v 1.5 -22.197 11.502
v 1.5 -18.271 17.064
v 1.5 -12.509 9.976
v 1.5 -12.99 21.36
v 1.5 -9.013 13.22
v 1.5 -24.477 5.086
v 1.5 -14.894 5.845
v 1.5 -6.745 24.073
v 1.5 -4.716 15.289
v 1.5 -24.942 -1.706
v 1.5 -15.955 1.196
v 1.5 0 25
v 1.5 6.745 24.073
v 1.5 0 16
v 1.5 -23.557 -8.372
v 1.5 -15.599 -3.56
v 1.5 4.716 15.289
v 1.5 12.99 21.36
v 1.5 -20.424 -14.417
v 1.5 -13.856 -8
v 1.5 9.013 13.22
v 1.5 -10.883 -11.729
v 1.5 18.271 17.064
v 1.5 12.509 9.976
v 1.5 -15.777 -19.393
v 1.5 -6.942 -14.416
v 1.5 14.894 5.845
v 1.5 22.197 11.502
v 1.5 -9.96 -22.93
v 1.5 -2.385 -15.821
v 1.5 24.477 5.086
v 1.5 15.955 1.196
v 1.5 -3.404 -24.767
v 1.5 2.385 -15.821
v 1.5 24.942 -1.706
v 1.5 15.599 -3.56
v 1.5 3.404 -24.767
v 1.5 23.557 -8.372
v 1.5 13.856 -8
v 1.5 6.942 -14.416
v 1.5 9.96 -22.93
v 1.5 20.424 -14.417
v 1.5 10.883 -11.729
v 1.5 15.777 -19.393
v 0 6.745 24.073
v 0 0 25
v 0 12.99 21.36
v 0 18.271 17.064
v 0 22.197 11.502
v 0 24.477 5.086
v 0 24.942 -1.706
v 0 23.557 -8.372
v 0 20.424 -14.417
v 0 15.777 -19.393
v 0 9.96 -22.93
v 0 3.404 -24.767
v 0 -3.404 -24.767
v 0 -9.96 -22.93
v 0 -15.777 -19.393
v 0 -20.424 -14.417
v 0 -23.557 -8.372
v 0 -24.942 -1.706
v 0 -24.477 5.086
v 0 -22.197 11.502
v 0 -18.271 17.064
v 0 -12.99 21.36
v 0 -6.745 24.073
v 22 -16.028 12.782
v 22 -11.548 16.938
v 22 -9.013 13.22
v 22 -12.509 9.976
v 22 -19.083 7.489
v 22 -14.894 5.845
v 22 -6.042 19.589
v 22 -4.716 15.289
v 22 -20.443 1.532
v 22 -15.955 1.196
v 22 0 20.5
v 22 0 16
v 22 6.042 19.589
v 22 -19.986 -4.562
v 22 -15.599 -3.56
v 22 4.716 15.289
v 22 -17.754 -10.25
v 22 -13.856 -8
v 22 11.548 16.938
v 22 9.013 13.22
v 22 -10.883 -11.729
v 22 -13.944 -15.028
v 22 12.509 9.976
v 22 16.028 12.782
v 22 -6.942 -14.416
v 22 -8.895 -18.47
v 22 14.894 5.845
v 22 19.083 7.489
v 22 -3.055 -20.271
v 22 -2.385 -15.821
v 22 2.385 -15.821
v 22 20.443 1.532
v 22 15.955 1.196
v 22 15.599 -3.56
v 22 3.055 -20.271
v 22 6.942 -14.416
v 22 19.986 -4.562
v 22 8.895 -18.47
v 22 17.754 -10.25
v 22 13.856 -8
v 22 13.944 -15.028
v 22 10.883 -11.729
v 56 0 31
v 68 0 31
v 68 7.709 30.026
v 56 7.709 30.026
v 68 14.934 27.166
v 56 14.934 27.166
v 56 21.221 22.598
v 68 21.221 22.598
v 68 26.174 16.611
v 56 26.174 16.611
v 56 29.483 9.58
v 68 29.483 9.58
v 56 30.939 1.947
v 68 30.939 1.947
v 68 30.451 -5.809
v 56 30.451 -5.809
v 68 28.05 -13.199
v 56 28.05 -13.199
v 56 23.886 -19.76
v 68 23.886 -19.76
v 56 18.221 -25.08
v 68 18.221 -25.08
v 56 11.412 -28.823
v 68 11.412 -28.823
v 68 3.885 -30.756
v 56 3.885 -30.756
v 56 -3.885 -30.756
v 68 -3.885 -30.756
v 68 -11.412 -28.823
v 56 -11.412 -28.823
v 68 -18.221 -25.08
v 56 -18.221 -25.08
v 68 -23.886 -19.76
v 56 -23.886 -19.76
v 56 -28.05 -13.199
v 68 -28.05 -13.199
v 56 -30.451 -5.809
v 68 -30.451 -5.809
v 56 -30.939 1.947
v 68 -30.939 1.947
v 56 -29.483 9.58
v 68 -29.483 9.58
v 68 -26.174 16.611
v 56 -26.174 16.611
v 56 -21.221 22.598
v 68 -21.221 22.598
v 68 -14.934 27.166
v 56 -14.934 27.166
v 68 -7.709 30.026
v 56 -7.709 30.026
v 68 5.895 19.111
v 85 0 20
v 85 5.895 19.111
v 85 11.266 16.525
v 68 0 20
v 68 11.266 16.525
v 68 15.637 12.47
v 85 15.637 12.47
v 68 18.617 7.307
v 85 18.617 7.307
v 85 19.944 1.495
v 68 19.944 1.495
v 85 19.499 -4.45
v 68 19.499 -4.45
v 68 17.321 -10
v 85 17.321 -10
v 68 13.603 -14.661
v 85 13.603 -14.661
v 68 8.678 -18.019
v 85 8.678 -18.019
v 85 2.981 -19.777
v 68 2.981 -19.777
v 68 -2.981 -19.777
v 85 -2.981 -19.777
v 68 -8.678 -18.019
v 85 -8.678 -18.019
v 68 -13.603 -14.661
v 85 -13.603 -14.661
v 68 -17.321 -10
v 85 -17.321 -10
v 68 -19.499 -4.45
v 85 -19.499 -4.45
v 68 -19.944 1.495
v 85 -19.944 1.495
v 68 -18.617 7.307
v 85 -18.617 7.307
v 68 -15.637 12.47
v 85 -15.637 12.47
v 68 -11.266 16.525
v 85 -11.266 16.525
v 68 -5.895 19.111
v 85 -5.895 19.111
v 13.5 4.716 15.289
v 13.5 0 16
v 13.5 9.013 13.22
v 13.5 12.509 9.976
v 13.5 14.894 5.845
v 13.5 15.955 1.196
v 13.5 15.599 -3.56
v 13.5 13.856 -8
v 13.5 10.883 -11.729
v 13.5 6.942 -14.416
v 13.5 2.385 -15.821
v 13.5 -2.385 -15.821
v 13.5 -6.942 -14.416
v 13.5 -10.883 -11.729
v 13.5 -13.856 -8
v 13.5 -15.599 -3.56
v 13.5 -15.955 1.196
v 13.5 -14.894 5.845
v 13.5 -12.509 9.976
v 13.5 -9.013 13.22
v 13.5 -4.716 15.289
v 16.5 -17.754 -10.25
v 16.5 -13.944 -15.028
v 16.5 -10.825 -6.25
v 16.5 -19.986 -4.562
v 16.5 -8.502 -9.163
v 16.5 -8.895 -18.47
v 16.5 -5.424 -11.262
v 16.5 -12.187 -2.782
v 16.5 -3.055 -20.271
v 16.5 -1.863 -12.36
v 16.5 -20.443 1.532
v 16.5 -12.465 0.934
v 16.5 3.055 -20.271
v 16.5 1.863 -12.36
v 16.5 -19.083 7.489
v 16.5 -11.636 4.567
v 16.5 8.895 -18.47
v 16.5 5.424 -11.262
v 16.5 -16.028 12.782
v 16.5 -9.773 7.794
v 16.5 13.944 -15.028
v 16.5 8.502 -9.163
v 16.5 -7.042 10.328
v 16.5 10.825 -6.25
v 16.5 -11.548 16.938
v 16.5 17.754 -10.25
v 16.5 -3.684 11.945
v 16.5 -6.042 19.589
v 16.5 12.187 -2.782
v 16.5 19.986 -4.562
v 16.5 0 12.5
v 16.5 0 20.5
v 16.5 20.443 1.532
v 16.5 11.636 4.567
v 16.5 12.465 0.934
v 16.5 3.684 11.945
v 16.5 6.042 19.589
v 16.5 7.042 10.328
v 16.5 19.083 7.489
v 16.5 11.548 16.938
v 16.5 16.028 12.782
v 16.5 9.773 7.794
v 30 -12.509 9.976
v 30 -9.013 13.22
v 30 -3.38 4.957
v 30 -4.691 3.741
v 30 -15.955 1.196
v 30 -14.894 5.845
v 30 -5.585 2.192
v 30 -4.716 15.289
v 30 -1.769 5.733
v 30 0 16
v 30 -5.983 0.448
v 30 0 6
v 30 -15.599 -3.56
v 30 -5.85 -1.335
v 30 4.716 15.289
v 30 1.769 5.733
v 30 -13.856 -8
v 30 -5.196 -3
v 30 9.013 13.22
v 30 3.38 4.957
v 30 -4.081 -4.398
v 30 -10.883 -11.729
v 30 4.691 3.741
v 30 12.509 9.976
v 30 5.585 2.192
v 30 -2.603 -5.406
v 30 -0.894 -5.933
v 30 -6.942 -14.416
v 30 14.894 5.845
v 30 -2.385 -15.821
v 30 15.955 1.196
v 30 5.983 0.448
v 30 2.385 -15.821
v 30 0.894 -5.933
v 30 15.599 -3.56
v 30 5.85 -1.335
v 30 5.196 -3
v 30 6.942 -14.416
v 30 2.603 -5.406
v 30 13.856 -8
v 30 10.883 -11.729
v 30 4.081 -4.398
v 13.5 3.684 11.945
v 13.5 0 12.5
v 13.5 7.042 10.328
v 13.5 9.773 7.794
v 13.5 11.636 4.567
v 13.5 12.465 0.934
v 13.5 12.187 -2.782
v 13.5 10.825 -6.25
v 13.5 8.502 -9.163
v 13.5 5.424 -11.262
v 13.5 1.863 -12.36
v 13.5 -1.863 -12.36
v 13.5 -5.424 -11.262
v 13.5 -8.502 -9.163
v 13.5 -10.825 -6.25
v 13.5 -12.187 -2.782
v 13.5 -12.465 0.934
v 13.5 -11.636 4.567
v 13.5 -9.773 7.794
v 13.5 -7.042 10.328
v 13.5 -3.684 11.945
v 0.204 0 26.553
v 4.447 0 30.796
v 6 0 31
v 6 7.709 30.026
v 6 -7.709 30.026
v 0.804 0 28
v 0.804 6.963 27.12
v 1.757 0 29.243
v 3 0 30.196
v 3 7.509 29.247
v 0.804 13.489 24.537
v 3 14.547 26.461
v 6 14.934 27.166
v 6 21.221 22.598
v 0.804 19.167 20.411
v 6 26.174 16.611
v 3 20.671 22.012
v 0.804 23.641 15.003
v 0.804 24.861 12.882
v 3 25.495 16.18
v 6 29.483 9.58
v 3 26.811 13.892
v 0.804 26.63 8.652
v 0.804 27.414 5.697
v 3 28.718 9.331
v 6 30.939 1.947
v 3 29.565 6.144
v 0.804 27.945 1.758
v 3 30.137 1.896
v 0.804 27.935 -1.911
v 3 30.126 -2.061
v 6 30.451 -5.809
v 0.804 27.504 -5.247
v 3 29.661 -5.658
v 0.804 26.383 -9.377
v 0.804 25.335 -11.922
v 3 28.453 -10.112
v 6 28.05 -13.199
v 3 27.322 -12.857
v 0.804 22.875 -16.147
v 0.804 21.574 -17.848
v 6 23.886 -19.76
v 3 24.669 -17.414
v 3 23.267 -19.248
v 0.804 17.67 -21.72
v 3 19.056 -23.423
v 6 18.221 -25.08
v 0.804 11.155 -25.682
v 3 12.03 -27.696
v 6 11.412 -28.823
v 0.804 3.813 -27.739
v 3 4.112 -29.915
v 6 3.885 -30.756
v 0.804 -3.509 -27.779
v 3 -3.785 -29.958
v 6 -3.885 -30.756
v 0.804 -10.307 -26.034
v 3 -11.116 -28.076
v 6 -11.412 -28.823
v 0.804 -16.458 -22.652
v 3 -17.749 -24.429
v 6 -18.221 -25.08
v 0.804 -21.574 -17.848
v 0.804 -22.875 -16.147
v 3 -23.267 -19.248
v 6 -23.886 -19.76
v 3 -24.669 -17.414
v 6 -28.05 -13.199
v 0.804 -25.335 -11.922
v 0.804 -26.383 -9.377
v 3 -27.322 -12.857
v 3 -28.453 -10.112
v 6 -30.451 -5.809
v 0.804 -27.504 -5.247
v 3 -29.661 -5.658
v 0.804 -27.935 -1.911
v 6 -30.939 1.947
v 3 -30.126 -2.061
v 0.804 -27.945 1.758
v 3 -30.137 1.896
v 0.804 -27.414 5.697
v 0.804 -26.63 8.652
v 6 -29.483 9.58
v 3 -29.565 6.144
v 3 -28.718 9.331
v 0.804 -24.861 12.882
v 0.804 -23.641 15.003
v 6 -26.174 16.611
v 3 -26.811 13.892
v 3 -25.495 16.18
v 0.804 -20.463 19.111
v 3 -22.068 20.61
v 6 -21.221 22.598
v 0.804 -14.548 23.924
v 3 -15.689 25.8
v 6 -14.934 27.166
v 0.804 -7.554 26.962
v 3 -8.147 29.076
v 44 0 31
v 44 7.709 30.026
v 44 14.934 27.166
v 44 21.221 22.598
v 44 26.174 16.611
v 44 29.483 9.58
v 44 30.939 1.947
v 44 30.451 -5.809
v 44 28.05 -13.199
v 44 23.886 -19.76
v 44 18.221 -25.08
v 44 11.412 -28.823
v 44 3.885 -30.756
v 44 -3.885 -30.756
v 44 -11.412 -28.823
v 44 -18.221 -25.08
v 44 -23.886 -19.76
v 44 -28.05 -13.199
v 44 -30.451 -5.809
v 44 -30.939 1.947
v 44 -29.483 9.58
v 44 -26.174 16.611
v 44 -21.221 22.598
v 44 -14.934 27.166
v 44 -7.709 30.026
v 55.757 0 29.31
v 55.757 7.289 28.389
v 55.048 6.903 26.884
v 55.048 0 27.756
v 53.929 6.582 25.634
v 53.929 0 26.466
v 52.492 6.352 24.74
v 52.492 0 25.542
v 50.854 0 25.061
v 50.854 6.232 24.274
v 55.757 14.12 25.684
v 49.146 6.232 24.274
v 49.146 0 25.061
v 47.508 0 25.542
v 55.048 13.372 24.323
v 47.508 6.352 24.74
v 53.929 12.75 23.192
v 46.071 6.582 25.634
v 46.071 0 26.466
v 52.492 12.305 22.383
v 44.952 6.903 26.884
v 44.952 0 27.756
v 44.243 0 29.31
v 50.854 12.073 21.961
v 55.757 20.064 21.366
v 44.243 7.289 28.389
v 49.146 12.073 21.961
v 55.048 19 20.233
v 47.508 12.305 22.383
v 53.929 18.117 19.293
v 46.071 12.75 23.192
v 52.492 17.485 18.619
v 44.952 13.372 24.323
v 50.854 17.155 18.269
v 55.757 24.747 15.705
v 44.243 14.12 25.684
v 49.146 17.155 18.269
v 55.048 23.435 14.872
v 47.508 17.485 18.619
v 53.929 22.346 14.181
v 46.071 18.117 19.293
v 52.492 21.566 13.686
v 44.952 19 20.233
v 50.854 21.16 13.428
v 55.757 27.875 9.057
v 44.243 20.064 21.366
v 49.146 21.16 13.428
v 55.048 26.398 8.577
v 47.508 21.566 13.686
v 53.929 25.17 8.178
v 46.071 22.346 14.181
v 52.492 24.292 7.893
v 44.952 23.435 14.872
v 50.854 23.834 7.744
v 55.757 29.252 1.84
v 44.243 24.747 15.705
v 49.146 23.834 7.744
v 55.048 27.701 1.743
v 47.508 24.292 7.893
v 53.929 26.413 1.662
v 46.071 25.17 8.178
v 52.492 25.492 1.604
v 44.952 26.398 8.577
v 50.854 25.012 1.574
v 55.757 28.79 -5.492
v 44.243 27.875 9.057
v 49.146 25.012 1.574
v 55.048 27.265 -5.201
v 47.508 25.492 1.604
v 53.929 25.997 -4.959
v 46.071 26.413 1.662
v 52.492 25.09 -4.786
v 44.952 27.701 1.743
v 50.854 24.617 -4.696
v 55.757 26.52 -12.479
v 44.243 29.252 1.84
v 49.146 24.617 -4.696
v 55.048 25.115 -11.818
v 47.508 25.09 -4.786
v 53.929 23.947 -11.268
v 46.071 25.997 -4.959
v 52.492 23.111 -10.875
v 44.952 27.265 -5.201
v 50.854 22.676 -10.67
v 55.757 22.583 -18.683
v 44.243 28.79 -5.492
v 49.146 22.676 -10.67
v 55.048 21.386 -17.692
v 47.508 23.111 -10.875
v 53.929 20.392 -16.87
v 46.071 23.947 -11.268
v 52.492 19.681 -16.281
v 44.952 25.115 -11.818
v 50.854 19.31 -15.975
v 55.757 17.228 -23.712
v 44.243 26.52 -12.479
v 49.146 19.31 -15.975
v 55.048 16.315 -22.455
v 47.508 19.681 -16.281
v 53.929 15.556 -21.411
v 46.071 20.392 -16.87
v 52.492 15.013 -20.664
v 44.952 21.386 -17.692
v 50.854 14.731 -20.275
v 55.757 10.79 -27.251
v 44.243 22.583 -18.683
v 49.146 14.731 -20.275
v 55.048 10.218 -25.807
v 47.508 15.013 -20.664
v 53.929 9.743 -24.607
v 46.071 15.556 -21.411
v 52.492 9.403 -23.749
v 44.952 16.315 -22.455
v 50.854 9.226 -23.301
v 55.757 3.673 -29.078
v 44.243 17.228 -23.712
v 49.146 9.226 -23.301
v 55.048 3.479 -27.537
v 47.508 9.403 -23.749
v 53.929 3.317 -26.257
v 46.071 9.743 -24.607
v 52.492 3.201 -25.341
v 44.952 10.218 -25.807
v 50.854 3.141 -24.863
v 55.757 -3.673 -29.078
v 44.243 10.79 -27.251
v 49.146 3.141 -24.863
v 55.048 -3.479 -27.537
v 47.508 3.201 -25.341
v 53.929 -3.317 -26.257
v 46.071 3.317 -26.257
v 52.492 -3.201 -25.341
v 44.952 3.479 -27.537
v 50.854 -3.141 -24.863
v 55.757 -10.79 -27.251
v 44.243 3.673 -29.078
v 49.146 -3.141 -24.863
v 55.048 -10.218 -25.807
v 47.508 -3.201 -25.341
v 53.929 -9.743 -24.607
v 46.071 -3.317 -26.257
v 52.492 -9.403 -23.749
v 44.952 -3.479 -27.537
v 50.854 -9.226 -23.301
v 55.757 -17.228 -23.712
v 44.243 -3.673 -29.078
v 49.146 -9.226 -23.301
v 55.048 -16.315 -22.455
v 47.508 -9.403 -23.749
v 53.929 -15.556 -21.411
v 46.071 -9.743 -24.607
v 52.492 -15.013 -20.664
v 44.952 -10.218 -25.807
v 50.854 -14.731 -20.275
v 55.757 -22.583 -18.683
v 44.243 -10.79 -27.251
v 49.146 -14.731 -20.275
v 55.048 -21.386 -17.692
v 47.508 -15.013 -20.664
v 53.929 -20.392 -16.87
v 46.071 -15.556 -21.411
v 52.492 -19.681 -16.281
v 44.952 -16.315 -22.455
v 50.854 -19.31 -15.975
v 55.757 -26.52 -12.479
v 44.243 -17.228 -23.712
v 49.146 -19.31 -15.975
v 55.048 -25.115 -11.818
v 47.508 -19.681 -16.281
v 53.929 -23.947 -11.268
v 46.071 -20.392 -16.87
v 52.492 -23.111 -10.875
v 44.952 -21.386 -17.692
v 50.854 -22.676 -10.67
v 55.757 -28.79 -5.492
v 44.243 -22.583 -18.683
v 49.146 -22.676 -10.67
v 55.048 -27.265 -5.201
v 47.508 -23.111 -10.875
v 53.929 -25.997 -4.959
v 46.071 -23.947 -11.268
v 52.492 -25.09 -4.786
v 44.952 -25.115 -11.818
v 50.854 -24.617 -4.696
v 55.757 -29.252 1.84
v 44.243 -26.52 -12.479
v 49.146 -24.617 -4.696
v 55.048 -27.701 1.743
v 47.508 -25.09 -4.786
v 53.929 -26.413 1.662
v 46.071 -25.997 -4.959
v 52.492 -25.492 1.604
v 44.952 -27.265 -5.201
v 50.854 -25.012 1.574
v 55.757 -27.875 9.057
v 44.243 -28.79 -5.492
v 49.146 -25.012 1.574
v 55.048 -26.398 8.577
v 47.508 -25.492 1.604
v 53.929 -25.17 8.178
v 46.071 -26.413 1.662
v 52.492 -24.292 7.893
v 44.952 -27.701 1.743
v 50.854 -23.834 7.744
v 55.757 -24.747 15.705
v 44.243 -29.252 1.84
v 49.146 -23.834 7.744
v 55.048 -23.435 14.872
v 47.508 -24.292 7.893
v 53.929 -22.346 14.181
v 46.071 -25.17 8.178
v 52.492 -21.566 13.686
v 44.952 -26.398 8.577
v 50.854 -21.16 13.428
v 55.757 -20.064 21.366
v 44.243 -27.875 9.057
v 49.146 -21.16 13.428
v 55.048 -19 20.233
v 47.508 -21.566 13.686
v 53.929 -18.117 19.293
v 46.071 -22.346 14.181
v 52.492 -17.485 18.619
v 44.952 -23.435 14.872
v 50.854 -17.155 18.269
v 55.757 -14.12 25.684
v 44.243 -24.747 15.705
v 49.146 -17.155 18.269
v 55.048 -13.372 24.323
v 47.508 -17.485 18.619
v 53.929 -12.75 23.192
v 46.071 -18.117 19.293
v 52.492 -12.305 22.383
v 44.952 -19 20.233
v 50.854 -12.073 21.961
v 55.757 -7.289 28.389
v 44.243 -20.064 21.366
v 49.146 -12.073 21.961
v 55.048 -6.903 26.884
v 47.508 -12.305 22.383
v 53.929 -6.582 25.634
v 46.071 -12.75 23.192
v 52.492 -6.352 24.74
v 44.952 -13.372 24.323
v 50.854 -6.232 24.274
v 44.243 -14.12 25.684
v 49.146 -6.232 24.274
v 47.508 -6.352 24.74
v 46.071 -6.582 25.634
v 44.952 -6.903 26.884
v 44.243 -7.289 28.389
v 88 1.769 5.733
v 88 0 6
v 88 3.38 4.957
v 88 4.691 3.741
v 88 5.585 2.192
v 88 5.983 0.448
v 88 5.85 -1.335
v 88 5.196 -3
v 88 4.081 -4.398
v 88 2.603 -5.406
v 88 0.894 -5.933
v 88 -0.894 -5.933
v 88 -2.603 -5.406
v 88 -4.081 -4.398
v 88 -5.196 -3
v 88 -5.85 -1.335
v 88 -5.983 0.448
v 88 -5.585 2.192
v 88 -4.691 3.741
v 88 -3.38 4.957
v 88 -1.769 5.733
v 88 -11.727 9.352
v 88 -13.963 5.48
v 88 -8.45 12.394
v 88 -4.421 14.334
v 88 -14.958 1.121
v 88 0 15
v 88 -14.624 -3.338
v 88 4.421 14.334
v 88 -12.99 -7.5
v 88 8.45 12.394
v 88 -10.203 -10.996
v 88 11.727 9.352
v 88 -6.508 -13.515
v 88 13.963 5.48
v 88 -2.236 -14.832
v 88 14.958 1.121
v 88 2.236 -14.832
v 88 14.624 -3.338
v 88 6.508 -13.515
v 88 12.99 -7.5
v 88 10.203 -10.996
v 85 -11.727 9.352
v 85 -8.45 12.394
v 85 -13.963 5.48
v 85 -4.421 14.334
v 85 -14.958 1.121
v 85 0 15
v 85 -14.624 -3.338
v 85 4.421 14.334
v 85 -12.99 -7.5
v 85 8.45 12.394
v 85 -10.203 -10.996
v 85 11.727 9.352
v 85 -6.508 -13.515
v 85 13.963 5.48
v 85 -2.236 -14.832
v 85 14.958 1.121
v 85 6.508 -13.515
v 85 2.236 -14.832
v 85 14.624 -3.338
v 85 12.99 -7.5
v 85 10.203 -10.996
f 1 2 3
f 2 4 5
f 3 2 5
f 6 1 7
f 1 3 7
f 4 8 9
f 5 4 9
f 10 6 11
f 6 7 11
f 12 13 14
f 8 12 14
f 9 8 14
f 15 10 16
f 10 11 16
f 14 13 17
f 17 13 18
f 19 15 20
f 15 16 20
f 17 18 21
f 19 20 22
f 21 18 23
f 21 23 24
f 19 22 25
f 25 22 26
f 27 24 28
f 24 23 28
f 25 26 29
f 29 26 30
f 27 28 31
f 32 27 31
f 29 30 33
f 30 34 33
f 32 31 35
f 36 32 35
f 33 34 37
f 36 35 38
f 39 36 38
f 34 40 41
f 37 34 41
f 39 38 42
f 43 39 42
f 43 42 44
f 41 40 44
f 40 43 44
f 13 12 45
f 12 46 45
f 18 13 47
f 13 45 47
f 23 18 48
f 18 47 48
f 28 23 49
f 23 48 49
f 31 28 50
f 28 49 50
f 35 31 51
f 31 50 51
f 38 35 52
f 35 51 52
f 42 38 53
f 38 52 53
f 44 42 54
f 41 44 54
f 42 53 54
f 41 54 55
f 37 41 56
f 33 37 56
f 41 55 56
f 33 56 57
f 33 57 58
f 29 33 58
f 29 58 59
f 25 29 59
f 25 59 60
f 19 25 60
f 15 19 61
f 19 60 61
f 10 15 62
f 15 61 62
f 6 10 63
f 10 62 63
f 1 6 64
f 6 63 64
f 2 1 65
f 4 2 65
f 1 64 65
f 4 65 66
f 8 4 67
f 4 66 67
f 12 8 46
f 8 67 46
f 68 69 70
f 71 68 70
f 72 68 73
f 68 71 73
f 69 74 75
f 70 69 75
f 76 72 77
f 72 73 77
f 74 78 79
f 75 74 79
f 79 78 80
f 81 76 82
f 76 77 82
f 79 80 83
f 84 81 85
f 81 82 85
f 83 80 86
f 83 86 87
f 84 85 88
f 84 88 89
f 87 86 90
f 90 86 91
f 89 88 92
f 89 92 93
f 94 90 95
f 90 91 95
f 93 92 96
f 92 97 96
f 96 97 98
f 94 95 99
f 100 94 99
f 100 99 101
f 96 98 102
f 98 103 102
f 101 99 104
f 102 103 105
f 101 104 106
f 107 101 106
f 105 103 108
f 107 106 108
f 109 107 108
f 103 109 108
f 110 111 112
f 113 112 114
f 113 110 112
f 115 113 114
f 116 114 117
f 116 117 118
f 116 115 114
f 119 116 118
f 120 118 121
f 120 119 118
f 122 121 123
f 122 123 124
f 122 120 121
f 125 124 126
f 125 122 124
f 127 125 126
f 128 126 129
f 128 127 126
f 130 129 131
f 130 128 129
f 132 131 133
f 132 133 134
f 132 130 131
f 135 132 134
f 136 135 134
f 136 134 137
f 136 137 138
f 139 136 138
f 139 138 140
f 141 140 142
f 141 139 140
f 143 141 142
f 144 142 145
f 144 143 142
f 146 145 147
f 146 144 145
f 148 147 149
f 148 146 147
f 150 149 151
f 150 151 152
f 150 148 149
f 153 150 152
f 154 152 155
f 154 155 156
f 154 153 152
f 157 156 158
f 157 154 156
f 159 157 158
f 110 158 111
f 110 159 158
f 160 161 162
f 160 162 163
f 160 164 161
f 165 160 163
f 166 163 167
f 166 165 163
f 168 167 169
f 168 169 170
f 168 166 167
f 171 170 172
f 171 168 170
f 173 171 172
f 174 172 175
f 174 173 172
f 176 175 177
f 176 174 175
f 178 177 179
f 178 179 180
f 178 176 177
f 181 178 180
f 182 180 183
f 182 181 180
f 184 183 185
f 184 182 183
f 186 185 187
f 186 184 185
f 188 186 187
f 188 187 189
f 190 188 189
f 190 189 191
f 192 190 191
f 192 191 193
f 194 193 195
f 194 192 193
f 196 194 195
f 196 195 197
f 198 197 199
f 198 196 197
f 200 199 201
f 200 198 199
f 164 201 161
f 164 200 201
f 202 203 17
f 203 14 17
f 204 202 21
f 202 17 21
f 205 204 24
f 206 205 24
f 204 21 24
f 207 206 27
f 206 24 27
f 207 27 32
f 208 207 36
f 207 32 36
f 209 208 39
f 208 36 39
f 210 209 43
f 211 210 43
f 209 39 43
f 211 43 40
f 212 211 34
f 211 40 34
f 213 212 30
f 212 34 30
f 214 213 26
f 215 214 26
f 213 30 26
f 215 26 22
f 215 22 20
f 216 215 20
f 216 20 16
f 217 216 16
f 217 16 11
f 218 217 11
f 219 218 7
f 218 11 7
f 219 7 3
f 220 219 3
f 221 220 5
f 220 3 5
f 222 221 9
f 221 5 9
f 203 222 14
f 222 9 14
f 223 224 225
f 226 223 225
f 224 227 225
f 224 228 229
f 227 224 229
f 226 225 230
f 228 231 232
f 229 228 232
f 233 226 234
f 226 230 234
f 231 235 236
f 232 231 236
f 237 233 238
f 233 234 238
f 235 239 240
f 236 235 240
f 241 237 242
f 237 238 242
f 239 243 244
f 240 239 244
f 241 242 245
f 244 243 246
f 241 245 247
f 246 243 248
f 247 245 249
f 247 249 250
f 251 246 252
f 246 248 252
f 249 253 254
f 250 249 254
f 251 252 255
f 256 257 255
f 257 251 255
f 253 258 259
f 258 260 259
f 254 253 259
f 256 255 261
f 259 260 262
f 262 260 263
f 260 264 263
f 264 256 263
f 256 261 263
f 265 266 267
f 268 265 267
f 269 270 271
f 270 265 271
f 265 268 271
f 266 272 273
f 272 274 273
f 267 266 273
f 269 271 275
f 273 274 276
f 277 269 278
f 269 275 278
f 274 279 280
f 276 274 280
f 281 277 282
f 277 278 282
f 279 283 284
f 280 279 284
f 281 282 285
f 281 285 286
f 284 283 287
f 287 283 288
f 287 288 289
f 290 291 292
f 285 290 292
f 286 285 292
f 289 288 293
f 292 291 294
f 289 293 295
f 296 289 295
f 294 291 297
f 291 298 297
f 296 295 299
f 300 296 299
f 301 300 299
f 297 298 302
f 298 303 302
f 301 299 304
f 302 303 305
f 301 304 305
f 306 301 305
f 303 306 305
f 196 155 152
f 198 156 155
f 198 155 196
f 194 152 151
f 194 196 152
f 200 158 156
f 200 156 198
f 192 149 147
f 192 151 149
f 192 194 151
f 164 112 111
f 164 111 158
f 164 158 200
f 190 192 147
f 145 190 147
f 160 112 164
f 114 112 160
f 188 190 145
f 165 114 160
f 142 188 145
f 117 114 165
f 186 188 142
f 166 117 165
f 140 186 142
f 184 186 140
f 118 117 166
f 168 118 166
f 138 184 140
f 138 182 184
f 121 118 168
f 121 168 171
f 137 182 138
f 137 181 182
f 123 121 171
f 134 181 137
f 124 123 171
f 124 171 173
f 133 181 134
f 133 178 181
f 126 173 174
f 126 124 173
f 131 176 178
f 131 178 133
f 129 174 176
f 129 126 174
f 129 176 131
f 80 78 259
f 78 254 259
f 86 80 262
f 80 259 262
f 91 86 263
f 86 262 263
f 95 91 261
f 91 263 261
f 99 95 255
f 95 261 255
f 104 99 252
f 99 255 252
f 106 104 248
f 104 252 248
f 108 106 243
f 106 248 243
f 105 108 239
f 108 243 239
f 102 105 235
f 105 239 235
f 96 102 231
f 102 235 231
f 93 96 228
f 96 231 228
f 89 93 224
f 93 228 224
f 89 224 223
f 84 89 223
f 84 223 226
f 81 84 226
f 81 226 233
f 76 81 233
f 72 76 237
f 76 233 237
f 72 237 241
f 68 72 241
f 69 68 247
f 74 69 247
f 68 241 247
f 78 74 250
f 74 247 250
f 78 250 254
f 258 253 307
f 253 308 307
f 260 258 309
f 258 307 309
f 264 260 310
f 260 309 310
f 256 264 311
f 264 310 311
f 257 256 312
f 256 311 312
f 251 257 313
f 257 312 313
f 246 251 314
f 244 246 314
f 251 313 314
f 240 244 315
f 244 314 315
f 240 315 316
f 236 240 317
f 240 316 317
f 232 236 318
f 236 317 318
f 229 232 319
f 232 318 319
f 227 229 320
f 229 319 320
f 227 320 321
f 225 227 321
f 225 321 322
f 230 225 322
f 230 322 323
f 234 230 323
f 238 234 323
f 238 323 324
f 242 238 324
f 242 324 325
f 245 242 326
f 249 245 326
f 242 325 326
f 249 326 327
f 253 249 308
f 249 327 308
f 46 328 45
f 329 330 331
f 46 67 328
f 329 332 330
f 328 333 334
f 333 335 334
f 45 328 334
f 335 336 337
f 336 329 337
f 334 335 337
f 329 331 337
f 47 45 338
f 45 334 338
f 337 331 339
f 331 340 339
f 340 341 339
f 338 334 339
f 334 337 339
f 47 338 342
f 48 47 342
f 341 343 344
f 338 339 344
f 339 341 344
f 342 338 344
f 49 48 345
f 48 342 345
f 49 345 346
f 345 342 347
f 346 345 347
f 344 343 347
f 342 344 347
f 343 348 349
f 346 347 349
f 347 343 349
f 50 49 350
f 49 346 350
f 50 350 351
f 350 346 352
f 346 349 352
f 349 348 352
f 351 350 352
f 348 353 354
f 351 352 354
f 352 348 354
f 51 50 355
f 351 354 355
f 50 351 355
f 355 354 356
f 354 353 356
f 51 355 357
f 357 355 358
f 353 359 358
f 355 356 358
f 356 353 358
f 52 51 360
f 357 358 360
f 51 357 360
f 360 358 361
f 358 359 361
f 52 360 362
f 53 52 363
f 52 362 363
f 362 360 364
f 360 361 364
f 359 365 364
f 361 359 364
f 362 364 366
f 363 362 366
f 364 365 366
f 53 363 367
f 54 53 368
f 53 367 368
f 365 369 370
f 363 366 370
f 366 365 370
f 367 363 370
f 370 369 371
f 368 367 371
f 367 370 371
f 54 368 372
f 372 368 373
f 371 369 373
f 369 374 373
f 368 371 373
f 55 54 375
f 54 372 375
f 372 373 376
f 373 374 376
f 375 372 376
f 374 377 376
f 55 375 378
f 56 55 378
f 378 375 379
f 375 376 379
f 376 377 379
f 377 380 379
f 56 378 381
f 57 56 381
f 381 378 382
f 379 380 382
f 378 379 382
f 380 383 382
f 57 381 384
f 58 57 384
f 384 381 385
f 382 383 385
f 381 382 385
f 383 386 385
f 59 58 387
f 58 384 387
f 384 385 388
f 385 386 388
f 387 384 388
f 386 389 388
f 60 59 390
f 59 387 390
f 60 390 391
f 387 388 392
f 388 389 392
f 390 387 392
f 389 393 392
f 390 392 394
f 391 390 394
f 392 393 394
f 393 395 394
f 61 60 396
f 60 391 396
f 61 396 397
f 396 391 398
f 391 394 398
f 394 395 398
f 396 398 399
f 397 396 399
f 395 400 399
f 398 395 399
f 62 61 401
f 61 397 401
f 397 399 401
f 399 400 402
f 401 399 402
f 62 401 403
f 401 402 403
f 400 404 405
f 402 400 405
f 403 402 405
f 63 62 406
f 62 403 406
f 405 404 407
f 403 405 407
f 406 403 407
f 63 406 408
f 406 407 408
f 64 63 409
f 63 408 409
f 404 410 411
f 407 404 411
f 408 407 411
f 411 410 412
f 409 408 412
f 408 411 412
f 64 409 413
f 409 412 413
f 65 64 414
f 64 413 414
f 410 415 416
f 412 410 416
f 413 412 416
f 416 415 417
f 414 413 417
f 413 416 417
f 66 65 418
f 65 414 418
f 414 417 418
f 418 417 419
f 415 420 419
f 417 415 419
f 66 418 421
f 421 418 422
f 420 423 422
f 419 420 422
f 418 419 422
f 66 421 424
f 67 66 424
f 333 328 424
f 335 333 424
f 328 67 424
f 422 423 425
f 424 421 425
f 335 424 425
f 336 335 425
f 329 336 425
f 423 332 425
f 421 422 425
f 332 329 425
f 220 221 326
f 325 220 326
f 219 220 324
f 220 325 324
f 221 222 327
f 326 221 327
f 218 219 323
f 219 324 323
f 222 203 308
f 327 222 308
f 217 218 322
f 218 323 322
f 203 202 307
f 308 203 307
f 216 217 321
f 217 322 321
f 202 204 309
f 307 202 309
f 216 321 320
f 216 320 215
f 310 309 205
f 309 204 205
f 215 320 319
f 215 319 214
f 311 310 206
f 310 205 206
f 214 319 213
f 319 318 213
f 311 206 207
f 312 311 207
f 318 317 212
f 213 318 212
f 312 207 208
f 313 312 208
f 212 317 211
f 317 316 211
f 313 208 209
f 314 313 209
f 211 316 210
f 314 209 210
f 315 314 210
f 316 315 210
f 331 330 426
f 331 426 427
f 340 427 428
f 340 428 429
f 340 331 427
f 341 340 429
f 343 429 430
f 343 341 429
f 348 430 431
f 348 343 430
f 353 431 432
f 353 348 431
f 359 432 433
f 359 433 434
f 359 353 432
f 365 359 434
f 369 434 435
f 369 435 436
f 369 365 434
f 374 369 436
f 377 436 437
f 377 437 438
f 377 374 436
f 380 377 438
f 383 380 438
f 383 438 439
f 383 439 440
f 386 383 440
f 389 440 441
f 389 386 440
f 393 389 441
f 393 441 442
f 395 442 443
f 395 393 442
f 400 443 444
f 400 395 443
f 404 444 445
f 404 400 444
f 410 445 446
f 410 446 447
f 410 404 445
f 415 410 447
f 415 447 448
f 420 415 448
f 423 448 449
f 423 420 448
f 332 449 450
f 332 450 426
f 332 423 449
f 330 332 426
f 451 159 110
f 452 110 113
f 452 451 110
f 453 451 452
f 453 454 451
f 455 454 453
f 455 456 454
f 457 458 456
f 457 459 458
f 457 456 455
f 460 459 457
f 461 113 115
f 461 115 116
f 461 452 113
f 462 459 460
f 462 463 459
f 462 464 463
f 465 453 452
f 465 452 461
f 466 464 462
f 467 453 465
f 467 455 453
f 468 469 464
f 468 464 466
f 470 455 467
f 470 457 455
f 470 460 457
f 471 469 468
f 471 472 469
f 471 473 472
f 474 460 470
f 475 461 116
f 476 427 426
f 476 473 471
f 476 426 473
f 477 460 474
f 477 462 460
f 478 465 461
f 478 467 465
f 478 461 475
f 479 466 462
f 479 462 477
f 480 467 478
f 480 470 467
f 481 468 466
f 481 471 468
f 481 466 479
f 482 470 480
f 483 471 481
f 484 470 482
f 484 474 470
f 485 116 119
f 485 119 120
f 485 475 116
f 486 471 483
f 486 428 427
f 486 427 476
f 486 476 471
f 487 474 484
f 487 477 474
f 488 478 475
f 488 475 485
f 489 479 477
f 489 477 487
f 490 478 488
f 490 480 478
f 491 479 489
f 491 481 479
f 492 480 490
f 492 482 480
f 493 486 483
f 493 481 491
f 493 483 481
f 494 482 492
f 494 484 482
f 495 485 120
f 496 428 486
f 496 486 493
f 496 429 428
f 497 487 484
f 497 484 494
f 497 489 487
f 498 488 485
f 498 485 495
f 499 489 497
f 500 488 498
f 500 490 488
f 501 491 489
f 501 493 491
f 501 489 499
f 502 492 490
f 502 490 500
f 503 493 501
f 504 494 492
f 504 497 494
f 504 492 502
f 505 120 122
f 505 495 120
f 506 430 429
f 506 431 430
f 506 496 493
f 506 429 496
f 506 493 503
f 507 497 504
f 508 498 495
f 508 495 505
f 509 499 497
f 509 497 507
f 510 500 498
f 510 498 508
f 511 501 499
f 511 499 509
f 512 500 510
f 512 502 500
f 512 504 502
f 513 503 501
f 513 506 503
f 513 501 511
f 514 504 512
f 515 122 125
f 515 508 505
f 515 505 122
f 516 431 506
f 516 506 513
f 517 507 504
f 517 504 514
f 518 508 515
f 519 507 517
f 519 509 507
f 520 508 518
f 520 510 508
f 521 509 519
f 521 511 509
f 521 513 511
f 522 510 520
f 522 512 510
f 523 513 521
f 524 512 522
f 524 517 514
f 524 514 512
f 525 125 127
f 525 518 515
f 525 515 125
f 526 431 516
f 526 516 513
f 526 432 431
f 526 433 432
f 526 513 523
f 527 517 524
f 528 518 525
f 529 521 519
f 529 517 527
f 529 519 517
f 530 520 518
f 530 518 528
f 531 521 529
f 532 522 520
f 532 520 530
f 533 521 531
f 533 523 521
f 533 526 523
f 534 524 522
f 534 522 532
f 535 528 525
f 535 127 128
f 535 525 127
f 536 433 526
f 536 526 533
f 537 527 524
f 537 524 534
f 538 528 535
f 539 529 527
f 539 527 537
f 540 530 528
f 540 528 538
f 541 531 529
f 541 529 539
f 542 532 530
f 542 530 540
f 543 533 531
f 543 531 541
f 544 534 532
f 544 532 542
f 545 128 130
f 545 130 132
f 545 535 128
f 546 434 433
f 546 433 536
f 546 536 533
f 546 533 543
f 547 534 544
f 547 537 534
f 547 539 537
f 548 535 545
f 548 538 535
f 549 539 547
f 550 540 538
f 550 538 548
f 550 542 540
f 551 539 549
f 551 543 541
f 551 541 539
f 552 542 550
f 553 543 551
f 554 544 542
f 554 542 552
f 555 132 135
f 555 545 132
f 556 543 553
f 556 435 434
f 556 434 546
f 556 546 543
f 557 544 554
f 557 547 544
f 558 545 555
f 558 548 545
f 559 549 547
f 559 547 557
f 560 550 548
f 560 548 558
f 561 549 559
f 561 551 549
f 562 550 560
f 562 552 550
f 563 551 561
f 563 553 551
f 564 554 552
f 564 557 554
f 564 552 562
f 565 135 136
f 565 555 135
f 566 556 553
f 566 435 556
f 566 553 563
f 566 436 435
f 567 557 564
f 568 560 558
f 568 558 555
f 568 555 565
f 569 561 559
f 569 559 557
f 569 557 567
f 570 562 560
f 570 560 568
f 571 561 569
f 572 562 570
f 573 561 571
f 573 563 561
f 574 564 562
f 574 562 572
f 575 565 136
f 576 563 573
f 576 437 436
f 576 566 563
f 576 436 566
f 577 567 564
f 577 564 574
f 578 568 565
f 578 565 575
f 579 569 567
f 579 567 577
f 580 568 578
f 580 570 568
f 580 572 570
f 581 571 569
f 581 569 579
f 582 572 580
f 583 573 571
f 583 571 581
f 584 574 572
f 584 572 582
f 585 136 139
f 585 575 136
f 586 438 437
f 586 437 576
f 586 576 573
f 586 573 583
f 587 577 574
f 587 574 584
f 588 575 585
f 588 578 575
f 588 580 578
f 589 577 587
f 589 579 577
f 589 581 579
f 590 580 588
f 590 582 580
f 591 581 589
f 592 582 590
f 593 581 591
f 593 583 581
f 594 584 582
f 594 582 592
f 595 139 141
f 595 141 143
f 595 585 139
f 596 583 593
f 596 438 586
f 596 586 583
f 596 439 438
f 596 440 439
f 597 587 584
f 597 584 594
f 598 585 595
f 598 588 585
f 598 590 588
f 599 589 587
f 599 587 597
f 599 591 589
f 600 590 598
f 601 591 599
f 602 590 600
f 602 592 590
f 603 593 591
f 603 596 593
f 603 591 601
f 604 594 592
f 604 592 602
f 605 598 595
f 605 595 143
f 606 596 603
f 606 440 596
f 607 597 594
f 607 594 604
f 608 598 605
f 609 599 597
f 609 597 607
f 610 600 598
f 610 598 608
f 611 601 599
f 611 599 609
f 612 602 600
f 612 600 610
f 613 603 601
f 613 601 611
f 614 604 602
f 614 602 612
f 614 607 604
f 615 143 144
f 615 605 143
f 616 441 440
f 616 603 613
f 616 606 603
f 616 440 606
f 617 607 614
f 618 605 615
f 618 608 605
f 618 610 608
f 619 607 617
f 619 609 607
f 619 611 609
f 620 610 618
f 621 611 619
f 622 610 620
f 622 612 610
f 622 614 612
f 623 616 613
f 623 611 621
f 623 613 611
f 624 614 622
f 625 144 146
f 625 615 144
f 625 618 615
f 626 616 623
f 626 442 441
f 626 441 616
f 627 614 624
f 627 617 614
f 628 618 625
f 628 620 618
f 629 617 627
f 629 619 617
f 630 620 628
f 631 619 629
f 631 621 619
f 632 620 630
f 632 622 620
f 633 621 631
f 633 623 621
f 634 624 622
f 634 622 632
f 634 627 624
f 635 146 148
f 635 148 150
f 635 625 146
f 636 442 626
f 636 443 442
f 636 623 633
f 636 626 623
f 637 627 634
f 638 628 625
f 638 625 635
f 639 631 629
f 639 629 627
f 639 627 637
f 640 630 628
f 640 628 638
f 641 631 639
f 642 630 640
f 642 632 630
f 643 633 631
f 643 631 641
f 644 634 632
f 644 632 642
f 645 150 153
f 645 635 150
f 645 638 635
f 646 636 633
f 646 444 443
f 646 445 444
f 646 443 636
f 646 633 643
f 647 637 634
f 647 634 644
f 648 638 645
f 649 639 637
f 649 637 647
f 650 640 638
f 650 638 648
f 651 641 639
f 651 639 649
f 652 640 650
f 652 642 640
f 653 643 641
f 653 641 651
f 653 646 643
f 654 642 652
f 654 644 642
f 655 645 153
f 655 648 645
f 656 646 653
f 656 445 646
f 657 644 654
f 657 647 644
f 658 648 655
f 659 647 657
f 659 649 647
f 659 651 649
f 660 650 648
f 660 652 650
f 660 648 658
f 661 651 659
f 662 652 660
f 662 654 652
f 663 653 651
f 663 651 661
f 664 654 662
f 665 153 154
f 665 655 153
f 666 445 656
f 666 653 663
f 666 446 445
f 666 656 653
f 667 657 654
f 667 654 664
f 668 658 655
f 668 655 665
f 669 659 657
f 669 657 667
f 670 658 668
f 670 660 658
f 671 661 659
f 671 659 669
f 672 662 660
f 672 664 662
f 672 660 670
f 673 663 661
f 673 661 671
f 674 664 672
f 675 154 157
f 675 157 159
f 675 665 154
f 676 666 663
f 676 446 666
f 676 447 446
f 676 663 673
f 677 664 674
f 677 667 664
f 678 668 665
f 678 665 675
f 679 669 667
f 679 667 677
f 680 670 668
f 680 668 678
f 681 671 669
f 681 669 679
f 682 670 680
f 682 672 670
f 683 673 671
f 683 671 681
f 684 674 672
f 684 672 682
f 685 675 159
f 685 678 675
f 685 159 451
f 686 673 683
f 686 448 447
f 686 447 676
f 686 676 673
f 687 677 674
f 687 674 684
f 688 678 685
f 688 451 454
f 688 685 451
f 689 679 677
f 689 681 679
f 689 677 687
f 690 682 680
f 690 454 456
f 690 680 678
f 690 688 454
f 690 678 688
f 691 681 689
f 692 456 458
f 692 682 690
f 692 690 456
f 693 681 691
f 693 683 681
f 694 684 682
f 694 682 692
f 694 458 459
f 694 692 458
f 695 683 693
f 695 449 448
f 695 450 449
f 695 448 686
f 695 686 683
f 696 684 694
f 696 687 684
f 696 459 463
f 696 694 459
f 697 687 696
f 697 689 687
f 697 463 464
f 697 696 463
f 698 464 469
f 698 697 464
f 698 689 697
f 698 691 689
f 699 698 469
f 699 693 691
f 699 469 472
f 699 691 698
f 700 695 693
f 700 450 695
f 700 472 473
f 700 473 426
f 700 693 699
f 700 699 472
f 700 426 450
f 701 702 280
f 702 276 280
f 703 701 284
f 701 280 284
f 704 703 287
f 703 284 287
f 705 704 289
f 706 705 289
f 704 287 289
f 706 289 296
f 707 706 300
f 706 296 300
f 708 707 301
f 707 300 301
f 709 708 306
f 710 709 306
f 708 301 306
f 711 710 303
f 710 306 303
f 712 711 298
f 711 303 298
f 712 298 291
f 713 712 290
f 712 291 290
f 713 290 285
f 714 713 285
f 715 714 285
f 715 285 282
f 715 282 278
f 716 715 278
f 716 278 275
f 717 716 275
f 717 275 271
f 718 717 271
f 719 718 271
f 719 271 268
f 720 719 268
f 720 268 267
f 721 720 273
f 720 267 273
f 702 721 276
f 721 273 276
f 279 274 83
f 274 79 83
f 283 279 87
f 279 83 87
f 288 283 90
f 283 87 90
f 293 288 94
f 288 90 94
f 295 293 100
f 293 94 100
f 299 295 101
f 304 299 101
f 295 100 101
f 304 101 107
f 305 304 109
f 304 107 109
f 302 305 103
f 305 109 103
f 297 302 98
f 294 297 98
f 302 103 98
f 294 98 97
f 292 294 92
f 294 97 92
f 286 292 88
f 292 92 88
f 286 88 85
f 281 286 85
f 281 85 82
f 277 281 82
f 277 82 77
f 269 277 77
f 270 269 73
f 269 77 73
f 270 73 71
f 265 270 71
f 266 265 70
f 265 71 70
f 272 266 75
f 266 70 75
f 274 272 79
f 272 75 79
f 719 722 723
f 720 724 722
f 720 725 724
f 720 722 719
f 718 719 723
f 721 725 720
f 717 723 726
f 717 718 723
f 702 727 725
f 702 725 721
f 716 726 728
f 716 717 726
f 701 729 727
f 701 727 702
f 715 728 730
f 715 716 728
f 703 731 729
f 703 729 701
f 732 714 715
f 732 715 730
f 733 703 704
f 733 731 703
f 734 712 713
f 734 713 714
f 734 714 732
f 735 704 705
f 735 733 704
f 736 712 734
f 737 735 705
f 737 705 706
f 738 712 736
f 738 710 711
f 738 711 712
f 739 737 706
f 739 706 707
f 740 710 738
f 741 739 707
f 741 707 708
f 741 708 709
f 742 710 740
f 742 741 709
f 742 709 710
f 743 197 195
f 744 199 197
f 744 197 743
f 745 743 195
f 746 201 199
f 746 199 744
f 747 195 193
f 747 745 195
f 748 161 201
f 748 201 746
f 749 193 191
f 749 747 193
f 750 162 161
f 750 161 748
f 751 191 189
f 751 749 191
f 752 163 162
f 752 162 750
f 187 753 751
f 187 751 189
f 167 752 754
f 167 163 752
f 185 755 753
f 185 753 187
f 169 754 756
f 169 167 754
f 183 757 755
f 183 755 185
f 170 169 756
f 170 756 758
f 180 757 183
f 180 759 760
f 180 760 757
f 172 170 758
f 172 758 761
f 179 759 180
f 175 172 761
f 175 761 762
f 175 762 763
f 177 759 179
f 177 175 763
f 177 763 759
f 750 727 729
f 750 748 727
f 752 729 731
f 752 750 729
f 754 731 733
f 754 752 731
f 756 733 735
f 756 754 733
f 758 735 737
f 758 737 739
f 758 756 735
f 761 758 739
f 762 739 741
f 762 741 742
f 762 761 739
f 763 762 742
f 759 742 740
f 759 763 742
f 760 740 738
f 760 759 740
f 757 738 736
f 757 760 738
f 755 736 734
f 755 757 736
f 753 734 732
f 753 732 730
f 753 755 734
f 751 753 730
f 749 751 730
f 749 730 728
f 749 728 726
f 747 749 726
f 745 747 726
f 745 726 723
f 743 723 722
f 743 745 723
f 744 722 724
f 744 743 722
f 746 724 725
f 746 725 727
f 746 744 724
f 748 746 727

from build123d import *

# Parameters (mm, degrees)
F4_R = 5.99999


# Not quite as in the source:
# - a fillet or chamfer is up to 0.001 mm smaller than in the source, because OpenCascade refuses the exact size


with BuildPart() as f1:
    # F0 (on Front) → F1 (revolve)
    with BuildSketch(Plane.XZ):
        with BuildLine():
            Line((0, 31), (0, 0))
            Line((0, 0), (88, 0))
            Line((88, 0), (88, 15))
            Line((88, 15), (85, 15))
            Line((85, 15), (85, 20))
            Line((85, 20), (68, 20))
            Line((68, 20), (68, 31))
            Line((68, 31), (56, 31))
            ThreePointArc((56, 31), (50, 25), (44, 31))
            Line((44, 31), (0, 31))
        make_face()
    revolve(axis=Axis((44, 0, 0), (-1, 0, 0)))

    # F2 (on Front) → F3 (revolve, cut)
    with BuildSketch(Plane.XZ):
        Polygon((0, 25), (0, 0), (88, 0), (88, 6), (30, 6), (30, 16), (22, 16), (22, 20.5), (16.5, 20.5), (16.5, 12.5), (13.5, 12.5), (13.5, 16), (1.5, 16), (1.5, 25), align=None)
    revolve(axis=Axis((-10.2086656565, 0, 0), (-1, 0, 0)), mode=Mode.SUBTRACT)

    # F4 (radius 6 in the source; OpenCascade refuses exactly that, so slightly less here)
    f4_edges = [f1.edges().sort_by_distance(p)[0] for p in [
        (0, 0, -31),
    ]]
    fillet(f4_edges, radius=F4_R)


solid = f1.part
